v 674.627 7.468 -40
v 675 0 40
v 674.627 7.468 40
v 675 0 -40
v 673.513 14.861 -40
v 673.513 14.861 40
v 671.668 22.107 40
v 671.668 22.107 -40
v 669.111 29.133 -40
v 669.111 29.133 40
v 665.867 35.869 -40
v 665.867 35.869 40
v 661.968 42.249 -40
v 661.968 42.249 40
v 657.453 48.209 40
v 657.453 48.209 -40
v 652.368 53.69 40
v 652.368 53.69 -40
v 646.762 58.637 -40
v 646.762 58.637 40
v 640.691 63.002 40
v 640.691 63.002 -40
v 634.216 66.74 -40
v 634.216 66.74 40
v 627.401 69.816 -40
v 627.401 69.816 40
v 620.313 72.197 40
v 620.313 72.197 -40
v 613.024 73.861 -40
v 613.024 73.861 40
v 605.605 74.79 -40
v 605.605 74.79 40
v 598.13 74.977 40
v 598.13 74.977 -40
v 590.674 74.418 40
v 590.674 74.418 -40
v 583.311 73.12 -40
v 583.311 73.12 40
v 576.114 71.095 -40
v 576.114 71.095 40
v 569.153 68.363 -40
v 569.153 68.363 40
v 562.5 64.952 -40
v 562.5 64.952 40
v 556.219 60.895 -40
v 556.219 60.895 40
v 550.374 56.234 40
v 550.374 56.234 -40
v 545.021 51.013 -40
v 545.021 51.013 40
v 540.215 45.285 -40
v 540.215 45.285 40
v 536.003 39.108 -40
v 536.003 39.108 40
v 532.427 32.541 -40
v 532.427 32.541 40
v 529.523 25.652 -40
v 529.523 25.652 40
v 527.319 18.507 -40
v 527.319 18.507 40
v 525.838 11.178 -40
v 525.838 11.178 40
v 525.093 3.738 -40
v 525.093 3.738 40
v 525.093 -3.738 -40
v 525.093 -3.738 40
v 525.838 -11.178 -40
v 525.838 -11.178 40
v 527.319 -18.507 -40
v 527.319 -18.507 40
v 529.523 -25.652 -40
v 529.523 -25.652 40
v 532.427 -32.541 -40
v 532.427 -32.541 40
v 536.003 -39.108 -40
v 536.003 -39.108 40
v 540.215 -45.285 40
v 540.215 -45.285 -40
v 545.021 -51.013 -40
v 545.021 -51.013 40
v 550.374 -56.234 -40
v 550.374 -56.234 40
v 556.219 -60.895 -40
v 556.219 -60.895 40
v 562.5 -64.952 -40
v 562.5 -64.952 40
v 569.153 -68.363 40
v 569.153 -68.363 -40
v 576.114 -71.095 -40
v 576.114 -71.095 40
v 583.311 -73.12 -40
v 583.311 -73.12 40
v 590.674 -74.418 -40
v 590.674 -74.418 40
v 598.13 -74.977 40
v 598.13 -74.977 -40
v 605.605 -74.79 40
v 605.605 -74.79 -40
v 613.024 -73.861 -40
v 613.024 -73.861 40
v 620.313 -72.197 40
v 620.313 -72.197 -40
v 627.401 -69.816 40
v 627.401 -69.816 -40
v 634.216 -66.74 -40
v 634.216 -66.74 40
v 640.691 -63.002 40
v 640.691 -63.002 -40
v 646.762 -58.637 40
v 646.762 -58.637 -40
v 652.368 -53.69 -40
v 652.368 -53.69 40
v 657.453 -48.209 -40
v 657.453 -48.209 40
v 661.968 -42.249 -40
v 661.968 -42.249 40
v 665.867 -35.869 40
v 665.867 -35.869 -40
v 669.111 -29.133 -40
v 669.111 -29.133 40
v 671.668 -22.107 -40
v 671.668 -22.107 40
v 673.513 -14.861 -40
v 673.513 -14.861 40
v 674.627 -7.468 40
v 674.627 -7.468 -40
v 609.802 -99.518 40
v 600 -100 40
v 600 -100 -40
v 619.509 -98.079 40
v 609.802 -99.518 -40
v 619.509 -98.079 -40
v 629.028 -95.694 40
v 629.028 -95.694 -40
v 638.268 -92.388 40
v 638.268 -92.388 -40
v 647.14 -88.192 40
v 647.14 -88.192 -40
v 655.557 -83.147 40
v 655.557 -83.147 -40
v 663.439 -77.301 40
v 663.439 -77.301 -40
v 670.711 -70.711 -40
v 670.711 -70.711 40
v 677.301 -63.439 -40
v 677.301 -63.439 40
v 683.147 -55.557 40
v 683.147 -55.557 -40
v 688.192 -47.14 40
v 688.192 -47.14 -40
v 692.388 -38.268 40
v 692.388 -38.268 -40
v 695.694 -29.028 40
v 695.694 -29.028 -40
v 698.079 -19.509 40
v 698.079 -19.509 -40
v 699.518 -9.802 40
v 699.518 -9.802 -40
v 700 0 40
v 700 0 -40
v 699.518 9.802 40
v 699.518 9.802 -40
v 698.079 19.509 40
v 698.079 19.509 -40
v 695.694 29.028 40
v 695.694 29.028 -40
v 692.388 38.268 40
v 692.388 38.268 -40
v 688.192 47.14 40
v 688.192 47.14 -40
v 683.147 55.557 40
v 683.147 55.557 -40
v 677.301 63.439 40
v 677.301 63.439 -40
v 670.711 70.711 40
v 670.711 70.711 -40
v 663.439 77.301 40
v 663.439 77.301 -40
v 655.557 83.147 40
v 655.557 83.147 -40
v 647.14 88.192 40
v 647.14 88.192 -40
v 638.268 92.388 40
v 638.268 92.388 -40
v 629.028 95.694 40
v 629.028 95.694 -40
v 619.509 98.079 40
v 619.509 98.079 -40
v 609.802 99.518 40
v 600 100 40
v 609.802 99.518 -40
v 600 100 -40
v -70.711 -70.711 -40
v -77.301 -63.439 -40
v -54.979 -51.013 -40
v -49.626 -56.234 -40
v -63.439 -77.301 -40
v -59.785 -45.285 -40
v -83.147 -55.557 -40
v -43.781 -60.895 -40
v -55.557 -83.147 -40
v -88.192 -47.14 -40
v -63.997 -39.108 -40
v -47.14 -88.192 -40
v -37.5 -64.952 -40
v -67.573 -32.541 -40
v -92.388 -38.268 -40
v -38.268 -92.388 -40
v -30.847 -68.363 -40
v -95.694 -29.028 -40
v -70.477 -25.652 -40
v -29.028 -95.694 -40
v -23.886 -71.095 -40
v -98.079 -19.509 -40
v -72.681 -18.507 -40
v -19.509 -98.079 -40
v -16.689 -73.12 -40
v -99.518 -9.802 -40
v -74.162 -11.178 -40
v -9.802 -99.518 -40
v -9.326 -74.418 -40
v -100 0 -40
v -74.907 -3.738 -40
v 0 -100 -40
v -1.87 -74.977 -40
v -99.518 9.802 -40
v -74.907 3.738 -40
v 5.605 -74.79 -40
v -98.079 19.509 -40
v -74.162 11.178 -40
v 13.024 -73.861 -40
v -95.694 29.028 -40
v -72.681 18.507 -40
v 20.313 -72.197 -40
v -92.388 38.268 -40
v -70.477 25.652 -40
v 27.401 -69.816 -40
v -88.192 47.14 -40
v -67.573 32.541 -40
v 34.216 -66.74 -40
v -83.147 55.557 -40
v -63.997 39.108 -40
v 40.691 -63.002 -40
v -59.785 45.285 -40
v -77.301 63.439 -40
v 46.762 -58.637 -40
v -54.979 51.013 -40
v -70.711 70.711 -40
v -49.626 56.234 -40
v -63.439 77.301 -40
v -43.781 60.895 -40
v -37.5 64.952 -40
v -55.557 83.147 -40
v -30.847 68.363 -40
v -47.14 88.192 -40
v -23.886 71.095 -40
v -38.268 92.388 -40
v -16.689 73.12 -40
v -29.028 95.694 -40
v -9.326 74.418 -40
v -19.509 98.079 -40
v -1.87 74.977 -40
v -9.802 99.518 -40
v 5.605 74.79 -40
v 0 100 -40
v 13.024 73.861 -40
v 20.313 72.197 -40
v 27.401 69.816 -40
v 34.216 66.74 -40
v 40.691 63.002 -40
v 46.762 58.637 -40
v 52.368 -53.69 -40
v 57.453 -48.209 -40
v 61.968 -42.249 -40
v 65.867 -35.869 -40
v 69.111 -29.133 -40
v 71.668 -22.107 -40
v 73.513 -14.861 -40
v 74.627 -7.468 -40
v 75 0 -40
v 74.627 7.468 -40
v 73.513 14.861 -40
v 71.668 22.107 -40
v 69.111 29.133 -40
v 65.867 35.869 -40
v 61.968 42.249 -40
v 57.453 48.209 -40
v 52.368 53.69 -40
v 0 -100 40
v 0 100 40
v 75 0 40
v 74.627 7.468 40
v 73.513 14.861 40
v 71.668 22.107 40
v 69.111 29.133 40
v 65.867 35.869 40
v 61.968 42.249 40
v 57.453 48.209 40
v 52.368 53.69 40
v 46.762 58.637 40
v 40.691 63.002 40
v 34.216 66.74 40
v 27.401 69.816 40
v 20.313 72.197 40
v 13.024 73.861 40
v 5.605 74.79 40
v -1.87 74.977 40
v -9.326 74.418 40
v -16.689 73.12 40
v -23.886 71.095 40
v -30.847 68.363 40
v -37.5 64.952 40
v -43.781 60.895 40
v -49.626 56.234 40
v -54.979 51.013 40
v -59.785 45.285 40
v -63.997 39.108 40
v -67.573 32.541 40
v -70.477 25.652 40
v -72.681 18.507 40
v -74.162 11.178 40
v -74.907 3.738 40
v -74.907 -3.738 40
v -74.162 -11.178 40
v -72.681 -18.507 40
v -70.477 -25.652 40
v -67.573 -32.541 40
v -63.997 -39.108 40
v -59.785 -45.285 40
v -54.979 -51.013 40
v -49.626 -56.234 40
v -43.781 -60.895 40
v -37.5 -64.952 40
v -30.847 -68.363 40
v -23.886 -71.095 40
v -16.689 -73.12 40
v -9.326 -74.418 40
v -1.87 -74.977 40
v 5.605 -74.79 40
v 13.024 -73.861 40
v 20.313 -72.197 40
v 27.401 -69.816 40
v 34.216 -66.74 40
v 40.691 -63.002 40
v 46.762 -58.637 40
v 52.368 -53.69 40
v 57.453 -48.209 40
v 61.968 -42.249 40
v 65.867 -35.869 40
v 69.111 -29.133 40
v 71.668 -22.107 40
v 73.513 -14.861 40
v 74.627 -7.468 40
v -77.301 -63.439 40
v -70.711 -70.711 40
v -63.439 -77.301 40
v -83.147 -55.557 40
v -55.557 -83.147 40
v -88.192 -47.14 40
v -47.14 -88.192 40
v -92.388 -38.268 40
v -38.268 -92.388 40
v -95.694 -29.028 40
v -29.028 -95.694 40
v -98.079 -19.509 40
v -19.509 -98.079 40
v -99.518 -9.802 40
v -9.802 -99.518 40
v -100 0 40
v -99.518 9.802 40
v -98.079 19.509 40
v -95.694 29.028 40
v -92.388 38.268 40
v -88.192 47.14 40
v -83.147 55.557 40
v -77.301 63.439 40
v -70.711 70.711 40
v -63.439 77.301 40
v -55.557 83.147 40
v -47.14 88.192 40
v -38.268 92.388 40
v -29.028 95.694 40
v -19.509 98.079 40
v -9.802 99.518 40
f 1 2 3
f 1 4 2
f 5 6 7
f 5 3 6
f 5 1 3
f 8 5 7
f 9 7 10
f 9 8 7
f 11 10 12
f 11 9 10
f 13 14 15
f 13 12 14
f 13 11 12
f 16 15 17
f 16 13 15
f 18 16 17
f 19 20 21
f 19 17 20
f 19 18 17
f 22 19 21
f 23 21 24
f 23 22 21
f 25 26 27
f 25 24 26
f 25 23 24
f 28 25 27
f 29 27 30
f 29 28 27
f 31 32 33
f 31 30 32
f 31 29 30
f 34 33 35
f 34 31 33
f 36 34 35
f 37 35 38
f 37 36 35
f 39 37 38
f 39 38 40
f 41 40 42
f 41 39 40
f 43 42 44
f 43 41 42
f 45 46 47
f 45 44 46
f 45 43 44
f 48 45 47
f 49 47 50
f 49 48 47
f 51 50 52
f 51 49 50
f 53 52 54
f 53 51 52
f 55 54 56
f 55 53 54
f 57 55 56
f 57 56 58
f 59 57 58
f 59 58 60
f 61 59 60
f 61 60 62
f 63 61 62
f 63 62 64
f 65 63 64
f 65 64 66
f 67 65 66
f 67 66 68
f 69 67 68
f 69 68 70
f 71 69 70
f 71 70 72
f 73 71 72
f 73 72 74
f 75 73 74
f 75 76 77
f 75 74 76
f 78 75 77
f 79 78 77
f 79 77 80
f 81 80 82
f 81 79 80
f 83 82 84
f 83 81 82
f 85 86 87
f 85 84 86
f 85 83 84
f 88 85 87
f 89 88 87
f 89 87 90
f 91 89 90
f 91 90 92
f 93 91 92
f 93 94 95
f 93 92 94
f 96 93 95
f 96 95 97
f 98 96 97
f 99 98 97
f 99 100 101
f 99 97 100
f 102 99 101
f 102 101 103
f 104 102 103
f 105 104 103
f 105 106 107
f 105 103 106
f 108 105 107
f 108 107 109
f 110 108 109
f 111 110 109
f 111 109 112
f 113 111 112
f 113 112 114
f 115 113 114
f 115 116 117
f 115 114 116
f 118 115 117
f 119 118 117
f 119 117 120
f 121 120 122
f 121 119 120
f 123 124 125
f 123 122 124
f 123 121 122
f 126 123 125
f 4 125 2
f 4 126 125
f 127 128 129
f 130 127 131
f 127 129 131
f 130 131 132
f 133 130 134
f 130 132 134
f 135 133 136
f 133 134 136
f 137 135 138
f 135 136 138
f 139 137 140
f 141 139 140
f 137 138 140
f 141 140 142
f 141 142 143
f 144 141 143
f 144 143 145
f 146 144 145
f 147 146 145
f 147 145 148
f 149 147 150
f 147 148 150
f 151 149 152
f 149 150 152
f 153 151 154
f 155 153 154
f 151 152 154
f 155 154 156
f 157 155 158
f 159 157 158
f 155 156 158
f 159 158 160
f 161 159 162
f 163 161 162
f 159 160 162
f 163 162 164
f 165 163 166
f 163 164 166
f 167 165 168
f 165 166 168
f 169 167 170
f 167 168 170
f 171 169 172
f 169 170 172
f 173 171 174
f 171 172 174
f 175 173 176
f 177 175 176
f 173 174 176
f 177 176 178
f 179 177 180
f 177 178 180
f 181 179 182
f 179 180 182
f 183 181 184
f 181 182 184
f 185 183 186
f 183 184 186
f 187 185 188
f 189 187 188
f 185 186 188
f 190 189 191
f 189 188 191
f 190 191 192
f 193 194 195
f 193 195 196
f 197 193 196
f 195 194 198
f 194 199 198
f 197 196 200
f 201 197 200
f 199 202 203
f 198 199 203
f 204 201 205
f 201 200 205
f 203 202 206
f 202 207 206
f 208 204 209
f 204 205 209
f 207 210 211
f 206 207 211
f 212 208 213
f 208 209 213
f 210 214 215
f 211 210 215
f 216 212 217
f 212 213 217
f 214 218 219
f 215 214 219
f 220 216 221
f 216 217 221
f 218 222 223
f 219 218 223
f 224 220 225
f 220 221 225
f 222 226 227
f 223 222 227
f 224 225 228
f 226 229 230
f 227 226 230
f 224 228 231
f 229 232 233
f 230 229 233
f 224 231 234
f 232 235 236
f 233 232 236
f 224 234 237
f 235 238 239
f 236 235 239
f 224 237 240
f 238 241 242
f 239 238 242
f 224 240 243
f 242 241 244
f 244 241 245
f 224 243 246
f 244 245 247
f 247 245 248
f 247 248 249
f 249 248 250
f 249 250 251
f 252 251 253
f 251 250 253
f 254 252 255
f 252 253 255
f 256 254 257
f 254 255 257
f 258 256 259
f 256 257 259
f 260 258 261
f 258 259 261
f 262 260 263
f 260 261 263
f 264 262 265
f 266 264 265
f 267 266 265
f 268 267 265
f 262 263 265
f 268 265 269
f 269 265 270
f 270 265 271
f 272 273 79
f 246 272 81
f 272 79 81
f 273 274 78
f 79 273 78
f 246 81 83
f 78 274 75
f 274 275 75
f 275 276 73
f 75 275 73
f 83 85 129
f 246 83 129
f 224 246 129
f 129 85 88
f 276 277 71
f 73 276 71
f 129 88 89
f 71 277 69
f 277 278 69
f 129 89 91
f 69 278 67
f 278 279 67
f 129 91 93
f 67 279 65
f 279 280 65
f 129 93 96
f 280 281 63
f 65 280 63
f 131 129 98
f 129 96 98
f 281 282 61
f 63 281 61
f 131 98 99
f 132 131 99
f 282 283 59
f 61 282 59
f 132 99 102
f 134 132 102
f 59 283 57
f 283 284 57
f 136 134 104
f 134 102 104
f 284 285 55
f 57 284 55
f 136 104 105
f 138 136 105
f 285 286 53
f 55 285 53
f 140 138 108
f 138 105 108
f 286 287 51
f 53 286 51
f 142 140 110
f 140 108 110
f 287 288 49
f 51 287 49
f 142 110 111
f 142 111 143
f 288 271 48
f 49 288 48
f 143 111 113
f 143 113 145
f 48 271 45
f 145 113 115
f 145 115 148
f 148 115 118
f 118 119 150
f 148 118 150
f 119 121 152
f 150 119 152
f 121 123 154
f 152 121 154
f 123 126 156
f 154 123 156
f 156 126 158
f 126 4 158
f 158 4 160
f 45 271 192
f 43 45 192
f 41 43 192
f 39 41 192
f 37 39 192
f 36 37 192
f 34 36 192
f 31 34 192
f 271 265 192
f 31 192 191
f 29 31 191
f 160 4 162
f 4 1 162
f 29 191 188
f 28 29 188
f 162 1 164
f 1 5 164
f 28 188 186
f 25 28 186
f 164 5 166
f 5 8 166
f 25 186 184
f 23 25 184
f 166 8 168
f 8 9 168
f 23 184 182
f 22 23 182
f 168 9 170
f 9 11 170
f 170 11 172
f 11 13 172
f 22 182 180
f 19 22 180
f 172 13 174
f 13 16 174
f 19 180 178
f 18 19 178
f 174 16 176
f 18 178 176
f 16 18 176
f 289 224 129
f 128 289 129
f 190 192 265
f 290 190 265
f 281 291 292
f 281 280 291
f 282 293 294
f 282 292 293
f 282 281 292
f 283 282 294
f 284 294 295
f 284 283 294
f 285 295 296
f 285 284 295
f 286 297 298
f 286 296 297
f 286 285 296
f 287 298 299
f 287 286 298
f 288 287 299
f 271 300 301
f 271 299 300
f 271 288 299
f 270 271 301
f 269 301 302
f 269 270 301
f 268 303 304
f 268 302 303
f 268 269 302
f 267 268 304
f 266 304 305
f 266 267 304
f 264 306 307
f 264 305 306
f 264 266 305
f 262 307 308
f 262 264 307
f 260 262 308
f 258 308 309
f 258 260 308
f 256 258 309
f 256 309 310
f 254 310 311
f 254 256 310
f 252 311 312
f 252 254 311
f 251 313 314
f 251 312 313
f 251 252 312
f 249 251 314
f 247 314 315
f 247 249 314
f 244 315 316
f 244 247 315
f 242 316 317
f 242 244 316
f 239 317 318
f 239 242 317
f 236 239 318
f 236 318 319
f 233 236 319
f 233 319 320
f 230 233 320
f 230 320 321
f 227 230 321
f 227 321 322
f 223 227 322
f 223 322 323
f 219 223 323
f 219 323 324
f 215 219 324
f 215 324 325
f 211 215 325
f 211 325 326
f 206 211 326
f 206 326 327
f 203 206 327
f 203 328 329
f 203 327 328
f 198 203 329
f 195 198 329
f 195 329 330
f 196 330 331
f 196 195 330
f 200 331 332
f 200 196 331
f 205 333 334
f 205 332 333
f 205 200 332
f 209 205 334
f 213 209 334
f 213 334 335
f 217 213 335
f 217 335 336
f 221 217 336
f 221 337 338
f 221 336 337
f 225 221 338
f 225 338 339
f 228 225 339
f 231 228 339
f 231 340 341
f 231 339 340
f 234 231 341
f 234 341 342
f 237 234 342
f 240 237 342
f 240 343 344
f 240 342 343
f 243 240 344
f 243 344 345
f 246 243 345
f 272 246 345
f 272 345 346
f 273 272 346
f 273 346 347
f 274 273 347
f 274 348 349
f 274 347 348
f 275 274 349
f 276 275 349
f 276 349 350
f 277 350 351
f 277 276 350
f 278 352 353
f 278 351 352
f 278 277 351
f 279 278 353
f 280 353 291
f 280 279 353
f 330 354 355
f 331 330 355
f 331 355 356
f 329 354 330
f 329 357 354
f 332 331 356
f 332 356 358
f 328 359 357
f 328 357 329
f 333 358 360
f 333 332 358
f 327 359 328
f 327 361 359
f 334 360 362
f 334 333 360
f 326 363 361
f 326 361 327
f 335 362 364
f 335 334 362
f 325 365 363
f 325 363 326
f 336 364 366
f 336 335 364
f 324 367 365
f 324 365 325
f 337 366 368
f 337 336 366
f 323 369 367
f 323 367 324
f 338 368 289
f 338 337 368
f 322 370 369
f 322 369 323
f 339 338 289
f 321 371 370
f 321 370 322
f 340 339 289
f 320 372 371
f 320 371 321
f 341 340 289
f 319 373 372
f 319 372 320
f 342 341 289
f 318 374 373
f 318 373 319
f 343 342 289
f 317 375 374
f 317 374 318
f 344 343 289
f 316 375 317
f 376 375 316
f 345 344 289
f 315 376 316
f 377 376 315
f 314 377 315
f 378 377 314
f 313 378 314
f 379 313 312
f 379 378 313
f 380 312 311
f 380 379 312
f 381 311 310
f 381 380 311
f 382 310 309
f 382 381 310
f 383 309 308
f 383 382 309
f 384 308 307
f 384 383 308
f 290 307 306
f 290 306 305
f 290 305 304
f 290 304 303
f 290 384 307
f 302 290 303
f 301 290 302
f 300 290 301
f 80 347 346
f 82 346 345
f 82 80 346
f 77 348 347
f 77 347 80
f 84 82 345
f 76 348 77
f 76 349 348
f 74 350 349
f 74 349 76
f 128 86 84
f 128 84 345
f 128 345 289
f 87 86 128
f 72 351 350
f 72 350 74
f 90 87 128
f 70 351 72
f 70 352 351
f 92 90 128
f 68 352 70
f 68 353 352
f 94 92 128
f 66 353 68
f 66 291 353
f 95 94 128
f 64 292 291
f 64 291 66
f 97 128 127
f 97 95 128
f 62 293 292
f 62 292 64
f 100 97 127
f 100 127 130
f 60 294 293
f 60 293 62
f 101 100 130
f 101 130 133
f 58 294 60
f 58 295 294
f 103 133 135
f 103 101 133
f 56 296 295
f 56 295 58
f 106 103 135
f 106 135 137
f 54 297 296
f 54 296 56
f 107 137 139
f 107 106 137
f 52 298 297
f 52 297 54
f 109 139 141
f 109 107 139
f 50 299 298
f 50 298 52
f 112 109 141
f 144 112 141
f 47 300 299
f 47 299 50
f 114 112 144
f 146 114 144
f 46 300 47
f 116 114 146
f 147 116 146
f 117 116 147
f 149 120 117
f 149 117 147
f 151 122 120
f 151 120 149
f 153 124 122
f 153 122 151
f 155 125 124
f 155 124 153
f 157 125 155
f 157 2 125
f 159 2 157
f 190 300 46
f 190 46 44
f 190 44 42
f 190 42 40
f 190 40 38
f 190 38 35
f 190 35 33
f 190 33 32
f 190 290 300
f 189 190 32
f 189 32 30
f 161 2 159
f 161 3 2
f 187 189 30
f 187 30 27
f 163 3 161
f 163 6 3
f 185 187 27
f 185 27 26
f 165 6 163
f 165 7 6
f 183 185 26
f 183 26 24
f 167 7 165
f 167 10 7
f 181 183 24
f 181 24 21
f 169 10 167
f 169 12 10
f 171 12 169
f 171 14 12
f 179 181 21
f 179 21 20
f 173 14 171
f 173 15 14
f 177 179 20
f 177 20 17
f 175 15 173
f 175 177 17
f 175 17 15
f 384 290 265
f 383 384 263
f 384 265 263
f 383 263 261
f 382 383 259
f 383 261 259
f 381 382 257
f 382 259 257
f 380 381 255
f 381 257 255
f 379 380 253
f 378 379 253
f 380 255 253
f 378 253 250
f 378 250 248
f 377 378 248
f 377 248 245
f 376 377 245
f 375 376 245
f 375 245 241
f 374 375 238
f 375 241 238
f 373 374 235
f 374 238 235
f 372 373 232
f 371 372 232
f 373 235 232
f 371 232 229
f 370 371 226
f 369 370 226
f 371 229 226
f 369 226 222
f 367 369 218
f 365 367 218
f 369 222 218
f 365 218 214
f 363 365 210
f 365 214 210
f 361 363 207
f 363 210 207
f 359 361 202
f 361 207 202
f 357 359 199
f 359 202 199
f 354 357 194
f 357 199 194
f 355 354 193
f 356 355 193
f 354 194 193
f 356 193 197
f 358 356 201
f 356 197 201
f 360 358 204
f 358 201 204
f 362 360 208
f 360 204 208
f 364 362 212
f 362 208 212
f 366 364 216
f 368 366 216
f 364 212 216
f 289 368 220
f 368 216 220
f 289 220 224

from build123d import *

# Parameters (mm, degrees)
BOSS_EXTRUDE1_DEPTH      = 40
BOSS_EXTRUDE1_DEPTH_BACK = 40
CUT_EXTRUDE1_DEPTH       = 200
CUT_EXTRUDE1_DEPTH_BACK  = 200
SKETCH7_R                = 75
CUT_EXTRUDE2_DEPTH       = 200
CUT_EXTRUDE2_DEPTH_BACK  = 200
SKETCH8_R                = 75


with BuildPart() as part:
    # Sketch2 → Boss-Extrude1 (new, two sides: drawn at the far end of the back side and taken through both)
    with BuildSketch(Plane.XY.offset(-BOSS_EXTRUDE1_DEPTH_BACK)):
        with BuildLine():
            Line((600, 100), (0, 100))
            ThreePointArc((0, 100), (-100, 0), (0, -100))
            Line((0, -100), (600, -100))
            ThreePointArc((600, -100), (700, 0), (600, 100))
        make_face()
    extrude(amount=BOSS_EXTRUDE1_DEPTH + BOSS_EXTRUDE1_DEPTH_BACK)

    # Sketch7 → Cut-Extrude1 (cut, two sides: drawn at the far end of the back side and taken through both)
    with BuildSketch(Plane.XY.offset(-CUT_EXTRUDE1_DEPTH_BACK)):
        Circle(SKETCH7_R)
    extrude(amount=CUT_EXTRUDE1_DEPTH + CUT_EXTRUDE1_DEPTH_BACK, mode=Mode.SUBTRACT)

    # Sketch8 → Cut-Extrude2 (cut, two sides: drawn at the far end of the back side and taken through both)
    with BuildSketch(Plane.XY.offset(-CUT_EXTRUDE2_DEPTH_BACK)):
        with Locations((600, 0)):
            Circle(SKETCH8_R)
    extrude(amount=CUT_EXTRUDE2_DEPTH + CUT_EXTRUDE2_DEPTH_BACK, mode=Mode.SUBTRACT)


solid = part.part
